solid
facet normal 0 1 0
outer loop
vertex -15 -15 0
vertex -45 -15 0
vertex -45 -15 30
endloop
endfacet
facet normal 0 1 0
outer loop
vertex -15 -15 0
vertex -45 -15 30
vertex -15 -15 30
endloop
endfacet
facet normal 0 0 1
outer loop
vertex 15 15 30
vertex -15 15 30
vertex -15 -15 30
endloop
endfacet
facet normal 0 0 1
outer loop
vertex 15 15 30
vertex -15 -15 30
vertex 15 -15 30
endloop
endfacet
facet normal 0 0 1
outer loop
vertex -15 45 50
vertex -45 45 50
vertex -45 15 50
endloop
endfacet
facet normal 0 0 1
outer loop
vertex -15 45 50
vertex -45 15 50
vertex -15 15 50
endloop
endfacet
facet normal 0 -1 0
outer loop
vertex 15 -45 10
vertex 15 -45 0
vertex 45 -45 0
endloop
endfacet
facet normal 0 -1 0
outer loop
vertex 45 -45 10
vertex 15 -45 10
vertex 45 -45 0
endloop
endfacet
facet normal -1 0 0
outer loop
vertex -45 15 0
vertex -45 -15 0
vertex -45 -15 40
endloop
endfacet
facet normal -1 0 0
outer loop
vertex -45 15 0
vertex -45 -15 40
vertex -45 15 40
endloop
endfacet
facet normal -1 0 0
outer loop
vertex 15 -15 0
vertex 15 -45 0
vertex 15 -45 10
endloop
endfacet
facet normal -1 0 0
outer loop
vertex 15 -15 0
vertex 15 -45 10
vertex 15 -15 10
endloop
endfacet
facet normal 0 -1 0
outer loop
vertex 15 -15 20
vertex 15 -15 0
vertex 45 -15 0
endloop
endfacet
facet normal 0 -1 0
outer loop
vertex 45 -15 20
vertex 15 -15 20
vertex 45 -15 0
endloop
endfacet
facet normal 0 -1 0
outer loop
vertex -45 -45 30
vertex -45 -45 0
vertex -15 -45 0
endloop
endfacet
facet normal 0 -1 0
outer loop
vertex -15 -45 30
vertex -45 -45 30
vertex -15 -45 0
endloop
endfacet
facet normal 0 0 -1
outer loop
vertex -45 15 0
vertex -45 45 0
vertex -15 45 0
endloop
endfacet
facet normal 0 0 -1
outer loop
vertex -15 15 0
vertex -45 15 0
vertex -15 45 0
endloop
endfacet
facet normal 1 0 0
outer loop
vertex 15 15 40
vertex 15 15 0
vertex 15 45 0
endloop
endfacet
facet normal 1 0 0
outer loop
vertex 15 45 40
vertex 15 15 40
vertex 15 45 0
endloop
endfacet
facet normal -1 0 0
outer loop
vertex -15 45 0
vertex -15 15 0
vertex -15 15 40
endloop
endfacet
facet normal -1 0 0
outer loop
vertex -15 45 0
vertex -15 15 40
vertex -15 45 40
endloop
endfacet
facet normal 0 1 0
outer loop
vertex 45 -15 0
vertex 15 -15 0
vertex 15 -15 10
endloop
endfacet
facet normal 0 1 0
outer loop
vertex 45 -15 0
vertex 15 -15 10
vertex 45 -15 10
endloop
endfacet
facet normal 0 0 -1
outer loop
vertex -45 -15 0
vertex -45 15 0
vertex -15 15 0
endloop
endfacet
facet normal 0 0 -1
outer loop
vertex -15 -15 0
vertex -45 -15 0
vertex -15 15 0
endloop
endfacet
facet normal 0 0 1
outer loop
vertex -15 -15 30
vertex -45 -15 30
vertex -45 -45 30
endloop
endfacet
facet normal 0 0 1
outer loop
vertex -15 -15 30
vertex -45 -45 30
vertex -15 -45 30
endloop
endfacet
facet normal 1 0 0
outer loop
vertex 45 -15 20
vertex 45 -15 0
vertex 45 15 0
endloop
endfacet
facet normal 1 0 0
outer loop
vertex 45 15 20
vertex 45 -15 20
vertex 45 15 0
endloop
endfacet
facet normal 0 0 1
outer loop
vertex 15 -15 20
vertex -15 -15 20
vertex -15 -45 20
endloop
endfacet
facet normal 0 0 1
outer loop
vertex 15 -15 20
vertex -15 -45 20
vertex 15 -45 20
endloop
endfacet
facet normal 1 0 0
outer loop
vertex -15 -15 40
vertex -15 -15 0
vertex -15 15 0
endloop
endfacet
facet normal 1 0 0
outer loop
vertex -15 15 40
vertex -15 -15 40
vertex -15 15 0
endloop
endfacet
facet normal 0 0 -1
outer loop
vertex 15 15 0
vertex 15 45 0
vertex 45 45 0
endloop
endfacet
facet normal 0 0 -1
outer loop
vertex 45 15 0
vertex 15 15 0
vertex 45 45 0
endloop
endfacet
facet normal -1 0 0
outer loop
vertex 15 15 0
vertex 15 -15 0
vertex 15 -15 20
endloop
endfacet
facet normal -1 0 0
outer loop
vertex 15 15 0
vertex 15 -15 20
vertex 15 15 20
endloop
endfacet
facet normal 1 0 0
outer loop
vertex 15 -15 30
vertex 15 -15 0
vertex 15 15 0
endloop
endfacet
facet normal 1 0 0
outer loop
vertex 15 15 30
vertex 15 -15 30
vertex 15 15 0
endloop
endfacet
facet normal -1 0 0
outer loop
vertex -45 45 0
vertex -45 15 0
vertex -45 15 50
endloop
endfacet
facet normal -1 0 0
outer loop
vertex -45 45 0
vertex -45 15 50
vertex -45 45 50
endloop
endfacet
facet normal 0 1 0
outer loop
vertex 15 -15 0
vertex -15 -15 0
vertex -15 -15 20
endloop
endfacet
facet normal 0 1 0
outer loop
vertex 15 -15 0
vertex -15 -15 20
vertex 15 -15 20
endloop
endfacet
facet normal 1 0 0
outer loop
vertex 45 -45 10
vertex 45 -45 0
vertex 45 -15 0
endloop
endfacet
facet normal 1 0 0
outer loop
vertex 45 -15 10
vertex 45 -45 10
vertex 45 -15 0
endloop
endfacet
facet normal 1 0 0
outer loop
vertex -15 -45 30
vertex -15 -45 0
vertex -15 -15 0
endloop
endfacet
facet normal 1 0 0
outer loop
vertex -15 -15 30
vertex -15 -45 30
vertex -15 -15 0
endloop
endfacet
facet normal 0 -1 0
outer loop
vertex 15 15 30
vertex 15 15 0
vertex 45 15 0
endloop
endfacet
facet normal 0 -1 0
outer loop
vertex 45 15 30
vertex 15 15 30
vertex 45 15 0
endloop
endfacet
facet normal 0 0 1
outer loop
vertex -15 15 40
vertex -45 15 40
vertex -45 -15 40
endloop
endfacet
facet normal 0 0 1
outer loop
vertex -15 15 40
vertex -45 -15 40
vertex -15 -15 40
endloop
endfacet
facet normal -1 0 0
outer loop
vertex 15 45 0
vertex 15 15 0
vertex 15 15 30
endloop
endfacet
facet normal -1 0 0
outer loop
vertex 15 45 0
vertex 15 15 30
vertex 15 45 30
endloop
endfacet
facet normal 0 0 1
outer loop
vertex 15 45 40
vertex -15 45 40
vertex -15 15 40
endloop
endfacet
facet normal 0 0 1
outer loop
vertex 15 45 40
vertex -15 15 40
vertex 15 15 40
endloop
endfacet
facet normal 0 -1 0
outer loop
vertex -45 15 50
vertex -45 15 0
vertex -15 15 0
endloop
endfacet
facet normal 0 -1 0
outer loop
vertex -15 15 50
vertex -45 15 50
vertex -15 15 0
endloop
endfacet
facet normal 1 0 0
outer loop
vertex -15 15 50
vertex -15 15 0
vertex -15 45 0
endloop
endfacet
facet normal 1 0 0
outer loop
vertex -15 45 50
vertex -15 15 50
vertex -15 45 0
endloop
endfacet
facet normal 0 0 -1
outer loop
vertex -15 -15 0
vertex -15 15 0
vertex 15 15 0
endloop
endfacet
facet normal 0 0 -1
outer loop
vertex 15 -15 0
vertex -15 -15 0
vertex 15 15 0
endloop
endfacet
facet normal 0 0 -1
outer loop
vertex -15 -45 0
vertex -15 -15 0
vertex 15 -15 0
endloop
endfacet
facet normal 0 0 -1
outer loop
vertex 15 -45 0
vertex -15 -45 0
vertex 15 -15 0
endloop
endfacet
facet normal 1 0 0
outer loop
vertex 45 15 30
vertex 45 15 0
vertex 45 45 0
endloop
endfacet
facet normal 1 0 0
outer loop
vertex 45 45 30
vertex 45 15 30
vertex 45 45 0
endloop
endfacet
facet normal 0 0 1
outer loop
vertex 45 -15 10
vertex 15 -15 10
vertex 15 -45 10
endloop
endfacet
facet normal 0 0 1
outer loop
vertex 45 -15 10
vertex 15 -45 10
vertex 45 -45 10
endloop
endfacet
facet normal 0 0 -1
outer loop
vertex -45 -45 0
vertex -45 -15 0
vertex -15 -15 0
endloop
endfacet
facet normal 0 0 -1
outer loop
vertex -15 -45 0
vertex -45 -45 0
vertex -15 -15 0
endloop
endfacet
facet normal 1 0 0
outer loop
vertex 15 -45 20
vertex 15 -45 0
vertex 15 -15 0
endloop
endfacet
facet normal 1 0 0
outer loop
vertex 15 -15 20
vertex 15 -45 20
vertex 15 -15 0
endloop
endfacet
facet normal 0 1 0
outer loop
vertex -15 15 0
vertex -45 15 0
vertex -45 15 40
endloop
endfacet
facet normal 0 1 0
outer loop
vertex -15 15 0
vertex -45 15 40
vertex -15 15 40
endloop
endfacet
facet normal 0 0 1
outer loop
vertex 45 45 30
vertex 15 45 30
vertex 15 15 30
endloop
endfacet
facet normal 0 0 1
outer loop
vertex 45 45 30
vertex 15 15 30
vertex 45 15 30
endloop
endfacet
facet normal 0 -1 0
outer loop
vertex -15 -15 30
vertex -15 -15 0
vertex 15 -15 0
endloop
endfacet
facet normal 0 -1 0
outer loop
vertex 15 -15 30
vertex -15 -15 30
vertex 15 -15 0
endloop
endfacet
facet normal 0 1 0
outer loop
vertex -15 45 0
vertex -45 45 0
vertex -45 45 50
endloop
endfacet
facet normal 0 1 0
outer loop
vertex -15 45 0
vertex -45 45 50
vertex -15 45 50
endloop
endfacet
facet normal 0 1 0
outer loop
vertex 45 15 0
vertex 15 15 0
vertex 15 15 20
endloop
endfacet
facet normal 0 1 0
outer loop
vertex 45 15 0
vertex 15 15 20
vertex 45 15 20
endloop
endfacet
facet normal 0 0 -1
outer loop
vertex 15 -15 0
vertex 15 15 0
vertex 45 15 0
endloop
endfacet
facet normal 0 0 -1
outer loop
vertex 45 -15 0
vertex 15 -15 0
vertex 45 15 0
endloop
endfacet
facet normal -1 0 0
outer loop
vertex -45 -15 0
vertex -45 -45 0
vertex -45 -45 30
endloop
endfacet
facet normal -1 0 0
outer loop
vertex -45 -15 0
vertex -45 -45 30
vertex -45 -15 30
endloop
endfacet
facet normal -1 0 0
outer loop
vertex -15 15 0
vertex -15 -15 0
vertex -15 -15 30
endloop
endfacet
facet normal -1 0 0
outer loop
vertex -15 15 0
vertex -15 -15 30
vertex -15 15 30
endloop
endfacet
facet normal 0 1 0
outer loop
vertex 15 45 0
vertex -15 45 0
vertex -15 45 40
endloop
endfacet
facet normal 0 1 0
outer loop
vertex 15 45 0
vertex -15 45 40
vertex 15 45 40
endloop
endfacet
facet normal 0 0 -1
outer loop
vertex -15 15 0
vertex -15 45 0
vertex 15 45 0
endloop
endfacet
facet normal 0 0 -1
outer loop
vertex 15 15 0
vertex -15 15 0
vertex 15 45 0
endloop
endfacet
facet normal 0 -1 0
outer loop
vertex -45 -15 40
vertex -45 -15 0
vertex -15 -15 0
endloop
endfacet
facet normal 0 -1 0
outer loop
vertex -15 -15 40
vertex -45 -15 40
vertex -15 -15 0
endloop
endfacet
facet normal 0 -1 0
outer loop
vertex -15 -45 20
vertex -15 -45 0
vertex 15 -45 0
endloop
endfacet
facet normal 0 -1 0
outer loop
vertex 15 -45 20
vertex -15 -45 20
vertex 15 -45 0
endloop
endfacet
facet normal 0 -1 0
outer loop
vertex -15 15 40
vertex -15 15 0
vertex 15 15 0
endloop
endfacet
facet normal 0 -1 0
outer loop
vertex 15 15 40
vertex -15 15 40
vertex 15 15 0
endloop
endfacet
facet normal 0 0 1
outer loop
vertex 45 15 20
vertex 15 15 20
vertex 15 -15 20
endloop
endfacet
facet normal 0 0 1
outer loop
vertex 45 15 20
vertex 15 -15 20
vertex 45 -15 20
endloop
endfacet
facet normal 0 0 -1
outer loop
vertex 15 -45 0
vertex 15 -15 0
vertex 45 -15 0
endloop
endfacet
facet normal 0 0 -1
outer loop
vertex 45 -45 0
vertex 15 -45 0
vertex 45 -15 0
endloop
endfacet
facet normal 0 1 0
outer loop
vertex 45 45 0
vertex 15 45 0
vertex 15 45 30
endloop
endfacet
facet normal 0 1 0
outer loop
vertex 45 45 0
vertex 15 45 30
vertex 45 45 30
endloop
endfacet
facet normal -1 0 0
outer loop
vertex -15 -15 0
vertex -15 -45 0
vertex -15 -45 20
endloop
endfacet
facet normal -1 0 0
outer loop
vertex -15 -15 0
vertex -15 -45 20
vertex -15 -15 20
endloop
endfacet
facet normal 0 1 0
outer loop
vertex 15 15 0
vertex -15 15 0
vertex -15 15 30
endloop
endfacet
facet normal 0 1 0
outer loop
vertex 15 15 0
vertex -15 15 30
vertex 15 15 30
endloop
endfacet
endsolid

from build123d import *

# Parameters (mm, degrees)
F0_W     = 30
F0_H     = 30
F1_DEPTH = 10
F2_DEPTH = 20
F3_DEPTH = 30
F4_DEPTH = 40
F5_DEPTH = 50


with BuildPart() as f1:
    # F0 (on Top) → F1 (new body)
    with BuildSketch(Plane.XY):
        with Locations((30, -30)):
            Rectangle(F0_W, F0_H)
    extrude(amount=F1_DEPTH)


with BuildPart() as f2:
    # F0 (on Top) → F2 (new body)
    with BuildSketch(Plane.XY):
        with Locations((0, -30)):
            Rectangle(F0_W, F0_H)
    extrude(amount=F2_DEPTH)


with BuildPart() as f2b:
    # F0 (on Top) → F2, piece 2 (new body)
    with BuildSketch(Plane.XY):
        with Locations((30, 0)):
            Rectangle(F0_W, F0_H)
    extrude(amount=F2_DEPTH)


with BuildPart() as f3:
    # F0 (on Top) → F3 (new body)
    with BuildSketch(Plane.XY):
        with Locations((-30, -30)):
            Rectangle(F0_W, F0_H)
    extrude(amount=F3_DEPTH)


with BuildPart() as f3b:
    # F0 (on Top) → F3, piece 2 (new body)
    with BuildSketch(Plane.XY):
        Rectangle(F0_W, F0_H)
    extrude(amount=F3_DEPTH)


with BuildPart() as f3c:
    # F0 (on Top) → F3, piece 3 (new body)
    with BuildSketch(Plane.XY):
        with Locations((30, 30)):
            Rectangle(F0_W, F0_H)
    extrude(amount=F3_DEPTH)


with BuildPart() as f4:
    # F0 (on Top) → F4 (new body)
    with BuildSketch(Plane.XY):
        with Locations((-30, 0)):
            Rectangle(F0_W, F0_H)
    extrude(amount=F4_DEPTH)


with BuildPart() as f4b:
    # F0 (on Top) → F4, piece 2 (new body)
    with BuildSketch(Plane.XY):
        with Locations((0, 30)):
            Rectangle(F0_W, F0_H)
    extrude(amount=F4_DEPTH)


with BuildPart() as f5:
    # F0 (on Top) → F5 (new body)
    with BuildSketch(Plane.XY):
        with Locations((-30, 30)):
            Rectangle(F0_W, F0_H)
    extrude(amount=F5_DEPTH)


solid = Compound([f1.part, f2.part, f2b.part, f3.part, f3b.part, f3c.part, f4.part, f4b.part, f5.part])
